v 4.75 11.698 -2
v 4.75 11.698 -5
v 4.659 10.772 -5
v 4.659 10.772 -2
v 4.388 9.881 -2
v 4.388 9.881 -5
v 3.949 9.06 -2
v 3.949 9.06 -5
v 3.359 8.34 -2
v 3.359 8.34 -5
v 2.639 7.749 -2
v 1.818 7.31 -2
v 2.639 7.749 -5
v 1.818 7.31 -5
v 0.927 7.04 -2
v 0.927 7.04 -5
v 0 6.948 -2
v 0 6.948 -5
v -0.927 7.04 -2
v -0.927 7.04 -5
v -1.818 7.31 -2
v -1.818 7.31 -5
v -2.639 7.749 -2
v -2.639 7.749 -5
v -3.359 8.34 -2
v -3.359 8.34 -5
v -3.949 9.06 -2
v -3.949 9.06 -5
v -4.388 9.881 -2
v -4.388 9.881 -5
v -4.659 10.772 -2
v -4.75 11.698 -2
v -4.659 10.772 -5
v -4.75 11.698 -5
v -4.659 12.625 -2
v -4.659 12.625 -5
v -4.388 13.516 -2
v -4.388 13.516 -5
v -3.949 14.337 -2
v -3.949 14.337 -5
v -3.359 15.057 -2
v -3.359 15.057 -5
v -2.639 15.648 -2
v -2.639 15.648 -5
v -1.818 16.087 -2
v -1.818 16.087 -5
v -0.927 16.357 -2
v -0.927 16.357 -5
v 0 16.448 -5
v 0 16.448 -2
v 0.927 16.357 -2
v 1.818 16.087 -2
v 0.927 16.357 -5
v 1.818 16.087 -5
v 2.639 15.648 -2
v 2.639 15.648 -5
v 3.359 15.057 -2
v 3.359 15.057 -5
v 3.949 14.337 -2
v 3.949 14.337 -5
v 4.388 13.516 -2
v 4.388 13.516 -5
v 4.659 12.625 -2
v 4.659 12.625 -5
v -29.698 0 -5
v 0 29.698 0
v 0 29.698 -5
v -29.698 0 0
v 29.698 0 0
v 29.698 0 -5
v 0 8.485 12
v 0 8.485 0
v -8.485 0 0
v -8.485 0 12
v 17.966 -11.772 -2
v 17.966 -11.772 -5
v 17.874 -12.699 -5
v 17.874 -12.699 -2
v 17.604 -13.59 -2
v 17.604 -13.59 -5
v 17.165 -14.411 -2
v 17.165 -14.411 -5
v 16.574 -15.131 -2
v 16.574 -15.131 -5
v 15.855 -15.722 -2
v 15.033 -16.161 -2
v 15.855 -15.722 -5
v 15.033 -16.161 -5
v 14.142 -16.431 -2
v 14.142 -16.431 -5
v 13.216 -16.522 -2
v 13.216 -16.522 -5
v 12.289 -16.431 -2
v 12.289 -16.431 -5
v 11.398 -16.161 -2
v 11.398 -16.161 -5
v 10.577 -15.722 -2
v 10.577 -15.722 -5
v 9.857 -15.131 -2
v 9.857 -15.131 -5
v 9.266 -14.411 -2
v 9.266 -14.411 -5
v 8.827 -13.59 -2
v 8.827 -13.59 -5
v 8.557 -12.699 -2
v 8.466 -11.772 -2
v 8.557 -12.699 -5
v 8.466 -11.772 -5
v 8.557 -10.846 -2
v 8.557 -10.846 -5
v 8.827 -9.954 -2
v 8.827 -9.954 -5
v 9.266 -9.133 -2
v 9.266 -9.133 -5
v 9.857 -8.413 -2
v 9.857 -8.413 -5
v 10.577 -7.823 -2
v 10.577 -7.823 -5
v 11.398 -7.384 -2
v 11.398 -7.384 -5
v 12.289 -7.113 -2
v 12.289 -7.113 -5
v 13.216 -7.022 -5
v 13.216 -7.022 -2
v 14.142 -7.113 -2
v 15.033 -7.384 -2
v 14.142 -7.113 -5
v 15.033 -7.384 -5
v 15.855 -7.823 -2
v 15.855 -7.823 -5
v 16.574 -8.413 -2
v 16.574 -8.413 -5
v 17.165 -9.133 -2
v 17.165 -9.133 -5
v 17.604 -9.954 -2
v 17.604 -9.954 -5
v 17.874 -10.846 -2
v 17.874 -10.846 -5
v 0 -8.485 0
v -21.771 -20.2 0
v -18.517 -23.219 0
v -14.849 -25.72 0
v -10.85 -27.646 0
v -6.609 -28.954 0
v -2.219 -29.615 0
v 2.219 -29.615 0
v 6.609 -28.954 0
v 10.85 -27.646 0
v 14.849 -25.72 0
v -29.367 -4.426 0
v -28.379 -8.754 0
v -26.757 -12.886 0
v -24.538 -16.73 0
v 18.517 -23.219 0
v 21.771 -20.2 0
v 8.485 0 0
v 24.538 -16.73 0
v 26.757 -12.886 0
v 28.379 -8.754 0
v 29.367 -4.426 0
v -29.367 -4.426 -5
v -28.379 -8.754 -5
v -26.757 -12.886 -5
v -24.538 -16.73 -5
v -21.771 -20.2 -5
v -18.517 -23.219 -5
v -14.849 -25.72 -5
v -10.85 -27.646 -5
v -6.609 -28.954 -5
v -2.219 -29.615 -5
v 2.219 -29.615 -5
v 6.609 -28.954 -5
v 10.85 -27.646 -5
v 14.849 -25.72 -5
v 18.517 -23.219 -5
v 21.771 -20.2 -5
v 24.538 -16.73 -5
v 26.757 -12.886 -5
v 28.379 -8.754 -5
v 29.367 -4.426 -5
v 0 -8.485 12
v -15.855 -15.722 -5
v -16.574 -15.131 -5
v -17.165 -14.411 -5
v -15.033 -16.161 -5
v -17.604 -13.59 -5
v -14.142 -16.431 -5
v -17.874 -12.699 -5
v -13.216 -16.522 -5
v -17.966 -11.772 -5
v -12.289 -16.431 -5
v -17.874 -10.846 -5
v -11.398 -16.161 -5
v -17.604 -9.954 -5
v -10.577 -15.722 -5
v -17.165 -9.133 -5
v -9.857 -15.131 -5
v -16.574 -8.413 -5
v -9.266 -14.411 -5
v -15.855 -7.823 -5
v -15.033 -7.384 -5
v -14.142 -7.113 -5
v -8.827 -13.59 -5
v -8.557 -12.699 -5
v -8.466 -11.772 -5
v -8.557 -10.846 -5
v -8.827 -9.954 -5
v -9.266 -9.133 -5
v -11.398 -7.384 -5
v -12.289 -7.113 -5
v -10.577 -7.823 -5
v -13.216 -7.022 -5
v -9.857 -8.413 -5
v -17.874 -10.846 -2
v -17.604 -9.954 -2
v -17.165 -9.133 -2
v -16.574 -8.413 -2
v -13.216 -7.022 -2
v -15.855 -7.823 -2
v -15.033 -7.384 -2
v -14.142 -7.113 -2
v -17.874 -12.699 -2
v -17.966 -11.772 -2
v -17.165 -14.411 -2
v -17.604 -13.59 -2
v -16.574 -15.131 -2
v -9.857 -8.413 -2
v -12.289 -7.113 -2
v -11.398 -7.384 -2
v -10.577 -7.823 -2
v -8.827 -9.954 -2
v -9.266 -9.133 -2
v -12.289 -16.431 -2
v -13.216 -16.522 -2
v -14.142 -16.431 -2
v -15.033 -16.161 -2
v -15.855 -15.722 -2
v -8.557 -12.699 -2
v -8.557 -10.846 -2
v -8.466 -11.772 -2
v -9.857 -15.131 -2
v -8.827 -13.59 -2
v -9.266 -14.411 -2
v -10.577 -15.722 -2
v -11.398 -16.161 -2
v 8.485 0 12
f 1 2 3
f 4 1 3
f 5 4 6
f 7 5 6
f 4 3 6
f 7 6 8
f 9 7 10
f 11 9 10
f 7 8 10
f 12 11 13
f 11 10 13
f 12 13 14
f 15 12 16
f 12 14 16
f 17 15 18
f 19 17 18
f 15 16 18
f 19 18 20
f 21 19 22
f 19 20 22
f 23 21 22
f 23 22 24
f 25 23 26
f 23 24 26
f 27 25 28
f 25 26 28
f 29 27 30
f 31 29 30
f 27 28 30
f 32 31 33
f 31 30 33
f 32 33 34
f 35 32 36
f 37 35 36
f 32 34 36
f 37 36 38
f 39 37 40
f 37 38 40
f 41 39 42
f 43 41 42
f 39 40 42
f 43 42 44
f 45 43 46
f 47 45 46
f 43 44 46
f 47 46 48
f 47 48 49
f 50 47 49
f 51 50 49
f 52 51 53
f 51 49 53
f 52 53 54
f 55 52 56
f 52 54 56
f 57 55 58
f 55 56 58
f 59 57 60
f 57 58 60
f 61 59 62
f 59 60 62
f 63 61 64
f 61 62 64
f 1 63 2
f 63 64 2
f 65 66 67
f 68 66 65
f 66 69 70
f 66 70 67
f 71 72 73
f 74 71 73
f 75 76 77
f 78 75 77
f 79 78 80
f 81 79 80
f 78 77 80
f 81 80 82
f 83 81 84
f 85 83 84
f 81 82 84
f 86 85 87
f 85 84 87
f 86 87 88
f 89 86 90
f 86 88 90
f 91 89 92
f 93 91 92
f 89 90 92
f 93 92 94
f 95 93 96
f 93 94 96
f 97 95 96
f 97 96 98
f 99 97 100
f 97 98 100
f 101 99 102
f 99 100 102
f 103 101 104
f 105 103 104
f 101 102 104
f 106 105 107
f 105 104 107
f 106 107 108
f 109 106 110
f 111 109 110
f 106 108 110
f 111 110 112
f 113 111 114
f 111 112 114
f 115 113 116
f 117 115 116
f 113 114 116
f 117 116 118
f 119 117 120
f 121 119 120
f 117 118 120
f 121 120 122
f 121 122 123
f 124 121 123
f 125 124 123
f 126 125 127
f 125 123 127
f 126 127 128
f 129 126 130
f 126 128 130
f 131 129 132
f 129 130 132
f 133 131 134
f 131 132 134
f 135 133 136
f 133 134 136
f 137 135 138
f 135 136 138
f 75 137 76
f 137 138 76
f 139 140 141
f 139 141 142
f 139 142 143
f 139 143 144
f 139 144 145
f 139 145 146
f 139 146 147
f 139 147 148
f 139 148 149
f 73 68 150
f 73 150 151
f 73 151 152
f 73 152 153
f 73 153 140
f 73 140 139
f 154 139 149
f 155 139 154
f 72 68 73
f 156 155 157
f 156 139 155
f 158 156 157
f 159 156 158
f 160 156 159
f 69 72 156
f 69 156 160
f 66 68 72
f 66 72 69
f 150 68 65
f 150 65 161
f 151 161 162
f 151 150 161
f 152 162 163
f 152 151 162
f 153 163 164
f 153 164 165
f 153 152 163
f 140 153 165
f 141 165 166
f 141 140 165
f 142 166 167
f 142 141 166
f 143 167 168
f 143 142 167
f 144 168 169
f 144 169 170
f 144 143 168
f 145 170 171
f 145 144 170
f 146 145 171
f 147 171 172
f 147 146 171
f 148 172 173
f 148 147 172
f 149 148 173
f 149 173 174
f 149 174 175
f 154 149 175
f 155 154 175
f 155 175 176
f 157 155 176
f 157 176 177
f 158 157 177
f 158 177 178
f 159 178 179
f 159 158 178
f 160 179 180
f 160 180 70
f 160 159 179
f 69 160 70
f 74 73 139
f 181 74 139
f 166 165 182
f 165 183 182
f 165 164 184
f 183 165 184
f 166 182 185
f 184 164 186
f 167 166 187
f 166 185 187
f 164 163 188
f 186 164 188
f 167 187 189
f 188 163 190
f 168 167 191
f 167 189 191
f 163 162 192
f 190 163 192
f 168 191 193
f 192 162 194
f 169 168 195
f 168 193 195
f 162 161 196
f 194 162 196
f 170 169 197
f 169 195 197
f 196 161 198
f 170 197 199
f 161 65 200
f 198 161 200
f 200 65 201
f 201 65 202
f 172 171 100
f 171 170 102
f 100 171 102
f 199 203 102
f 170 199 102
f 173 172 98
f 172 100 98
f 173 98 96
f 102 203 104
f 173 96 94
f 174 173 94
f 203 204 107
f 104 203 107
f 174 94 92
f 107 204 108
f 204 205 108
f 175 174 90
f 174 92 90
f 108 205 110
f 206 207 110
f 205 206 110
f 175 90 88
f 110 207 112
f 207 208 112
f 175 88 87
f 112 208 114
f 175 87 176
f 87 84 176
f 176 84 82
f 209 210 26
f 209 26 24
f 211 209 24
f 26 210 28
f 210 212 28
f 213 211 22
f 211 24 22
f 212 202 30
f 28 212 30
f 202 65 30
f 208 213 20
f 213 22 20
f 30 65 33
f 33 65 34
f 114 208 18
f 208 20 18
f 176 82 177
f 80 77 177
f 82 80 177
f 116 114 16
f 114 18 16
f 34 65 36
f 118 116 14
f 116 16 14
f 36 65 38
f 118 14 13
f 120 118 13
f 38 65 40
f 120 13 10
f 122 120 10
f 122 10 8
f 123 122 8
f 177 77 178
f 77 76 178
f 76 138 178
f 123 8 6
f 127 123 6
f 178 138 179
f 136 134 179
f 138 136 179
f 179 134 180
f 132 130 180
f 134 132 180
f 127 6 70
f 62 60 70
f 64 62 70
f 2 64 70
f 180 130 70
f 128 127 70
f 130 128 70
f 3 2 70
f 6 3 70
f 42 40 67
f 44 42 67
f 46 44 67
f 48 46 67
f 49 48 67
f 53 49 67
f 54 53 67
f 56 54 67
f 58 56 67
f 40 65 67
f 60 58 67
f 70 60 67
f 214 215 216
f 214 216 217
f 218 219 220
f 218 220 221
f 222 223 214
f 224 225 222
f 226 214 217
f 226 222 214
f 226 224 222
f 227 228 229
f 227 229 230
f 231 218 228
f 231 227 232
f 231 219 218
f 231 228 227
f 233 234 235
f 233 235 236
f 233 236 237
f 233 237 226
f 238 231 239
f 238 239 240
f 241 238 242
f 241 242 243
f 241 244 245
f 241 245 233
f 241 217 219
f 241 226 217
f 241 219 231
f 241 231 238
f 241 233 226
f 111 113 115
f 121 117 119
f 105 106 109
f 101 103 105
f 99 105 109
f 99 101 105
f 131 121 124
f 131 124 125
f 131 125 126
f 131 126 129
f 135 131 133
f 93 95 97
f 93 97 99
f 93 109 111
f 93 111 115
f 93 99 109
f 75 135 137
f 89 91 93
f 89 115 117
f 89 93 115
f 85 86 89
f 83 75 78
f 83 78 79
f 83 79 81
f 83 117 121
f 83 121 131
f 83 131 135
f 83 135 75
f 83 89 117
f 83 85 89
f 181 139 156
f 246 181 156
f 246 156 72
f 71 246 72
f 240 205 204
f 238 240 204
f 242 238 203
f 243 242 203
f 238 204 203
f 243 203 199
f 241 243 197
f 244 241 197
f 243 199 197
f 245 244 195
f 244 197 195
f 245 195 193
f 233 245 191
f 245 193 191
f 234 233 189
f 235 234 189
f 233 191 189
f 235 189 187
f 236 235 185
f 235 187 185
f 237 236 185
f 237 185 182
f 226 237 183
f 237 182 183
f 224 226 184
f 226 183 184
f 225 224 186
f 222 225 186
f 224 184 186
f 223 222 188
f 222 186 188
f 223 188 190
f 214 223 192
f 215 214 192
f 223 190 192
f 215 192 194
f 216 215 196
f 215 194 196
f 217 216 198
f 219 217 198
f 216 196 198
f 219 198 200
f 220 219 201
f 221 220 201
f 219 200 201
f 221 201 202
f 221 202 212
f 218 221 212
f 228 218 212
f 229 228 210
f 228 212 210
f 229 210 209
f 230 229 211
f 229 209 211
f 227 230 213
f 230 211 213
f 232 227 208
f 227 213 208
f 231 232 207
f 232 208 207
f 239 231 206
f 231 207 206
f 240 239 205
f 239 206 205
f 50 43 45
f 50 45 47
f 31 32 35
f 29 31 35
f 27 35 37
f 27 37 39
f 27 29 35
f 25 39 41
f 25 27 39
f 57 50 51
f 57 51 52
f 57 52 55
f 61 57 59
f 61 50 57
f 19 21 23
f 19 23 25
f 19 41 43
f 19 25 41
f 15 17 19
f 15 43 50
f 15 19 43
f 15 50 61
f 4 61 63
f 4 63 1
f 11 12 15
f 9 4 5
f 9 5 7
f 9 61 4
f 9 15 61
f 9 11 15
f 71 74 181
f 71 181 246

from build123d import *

# Parameters (mm, degrees)
F2_DEPTH = 12
F4_DEPTH = 5
F5_R     = 4.75
F6_DEPTH = 3


with BuildPart() as f2:
    # F1 (on Top) → F2 (new body)
    with BuildSketch(Plane.XY):
        Polygon((-8.4852813742, 0), (0, -8.4852813742), (8.4852813742, 0), (0, 8.4852813742), align=None)
    extrude(amount=F2_DEPTH)

    # F3 (on Top) → F4 (join)
    with BuildSketch(Plane.XY):
        with BuildLine():
            Line((0, 29.6984848098), (-29.6984848098, 0))
            ThreePointArc((-29.6984848098, 0), (0, -29.6984848098), (29.6984848098, 0))
            Line((29.6984848098, 0), (0, 29.6984848098))
        make_face()
    extrude(amount=-F4_DEPTH)

    # F5 (on face) → F6 (cut)
    with BuildSketch(Plane(origin=(0, 0, -5), x_dir=(1, 0, 0), z_dir=(0, 0, -1))):
        with Locations((0, -11.6984848098)):
            Circle(F5_R)
        with Locations((-13.2155881356, 11.7721958357)):
            Circle(F5_R)
        with Locations((13.2155881356, 11.7721958357)):
            Circle(F5_R)
    extrude(amount=-F6_DEPTH, mode=Mode.SUBTRACT)


solid = f2.part
